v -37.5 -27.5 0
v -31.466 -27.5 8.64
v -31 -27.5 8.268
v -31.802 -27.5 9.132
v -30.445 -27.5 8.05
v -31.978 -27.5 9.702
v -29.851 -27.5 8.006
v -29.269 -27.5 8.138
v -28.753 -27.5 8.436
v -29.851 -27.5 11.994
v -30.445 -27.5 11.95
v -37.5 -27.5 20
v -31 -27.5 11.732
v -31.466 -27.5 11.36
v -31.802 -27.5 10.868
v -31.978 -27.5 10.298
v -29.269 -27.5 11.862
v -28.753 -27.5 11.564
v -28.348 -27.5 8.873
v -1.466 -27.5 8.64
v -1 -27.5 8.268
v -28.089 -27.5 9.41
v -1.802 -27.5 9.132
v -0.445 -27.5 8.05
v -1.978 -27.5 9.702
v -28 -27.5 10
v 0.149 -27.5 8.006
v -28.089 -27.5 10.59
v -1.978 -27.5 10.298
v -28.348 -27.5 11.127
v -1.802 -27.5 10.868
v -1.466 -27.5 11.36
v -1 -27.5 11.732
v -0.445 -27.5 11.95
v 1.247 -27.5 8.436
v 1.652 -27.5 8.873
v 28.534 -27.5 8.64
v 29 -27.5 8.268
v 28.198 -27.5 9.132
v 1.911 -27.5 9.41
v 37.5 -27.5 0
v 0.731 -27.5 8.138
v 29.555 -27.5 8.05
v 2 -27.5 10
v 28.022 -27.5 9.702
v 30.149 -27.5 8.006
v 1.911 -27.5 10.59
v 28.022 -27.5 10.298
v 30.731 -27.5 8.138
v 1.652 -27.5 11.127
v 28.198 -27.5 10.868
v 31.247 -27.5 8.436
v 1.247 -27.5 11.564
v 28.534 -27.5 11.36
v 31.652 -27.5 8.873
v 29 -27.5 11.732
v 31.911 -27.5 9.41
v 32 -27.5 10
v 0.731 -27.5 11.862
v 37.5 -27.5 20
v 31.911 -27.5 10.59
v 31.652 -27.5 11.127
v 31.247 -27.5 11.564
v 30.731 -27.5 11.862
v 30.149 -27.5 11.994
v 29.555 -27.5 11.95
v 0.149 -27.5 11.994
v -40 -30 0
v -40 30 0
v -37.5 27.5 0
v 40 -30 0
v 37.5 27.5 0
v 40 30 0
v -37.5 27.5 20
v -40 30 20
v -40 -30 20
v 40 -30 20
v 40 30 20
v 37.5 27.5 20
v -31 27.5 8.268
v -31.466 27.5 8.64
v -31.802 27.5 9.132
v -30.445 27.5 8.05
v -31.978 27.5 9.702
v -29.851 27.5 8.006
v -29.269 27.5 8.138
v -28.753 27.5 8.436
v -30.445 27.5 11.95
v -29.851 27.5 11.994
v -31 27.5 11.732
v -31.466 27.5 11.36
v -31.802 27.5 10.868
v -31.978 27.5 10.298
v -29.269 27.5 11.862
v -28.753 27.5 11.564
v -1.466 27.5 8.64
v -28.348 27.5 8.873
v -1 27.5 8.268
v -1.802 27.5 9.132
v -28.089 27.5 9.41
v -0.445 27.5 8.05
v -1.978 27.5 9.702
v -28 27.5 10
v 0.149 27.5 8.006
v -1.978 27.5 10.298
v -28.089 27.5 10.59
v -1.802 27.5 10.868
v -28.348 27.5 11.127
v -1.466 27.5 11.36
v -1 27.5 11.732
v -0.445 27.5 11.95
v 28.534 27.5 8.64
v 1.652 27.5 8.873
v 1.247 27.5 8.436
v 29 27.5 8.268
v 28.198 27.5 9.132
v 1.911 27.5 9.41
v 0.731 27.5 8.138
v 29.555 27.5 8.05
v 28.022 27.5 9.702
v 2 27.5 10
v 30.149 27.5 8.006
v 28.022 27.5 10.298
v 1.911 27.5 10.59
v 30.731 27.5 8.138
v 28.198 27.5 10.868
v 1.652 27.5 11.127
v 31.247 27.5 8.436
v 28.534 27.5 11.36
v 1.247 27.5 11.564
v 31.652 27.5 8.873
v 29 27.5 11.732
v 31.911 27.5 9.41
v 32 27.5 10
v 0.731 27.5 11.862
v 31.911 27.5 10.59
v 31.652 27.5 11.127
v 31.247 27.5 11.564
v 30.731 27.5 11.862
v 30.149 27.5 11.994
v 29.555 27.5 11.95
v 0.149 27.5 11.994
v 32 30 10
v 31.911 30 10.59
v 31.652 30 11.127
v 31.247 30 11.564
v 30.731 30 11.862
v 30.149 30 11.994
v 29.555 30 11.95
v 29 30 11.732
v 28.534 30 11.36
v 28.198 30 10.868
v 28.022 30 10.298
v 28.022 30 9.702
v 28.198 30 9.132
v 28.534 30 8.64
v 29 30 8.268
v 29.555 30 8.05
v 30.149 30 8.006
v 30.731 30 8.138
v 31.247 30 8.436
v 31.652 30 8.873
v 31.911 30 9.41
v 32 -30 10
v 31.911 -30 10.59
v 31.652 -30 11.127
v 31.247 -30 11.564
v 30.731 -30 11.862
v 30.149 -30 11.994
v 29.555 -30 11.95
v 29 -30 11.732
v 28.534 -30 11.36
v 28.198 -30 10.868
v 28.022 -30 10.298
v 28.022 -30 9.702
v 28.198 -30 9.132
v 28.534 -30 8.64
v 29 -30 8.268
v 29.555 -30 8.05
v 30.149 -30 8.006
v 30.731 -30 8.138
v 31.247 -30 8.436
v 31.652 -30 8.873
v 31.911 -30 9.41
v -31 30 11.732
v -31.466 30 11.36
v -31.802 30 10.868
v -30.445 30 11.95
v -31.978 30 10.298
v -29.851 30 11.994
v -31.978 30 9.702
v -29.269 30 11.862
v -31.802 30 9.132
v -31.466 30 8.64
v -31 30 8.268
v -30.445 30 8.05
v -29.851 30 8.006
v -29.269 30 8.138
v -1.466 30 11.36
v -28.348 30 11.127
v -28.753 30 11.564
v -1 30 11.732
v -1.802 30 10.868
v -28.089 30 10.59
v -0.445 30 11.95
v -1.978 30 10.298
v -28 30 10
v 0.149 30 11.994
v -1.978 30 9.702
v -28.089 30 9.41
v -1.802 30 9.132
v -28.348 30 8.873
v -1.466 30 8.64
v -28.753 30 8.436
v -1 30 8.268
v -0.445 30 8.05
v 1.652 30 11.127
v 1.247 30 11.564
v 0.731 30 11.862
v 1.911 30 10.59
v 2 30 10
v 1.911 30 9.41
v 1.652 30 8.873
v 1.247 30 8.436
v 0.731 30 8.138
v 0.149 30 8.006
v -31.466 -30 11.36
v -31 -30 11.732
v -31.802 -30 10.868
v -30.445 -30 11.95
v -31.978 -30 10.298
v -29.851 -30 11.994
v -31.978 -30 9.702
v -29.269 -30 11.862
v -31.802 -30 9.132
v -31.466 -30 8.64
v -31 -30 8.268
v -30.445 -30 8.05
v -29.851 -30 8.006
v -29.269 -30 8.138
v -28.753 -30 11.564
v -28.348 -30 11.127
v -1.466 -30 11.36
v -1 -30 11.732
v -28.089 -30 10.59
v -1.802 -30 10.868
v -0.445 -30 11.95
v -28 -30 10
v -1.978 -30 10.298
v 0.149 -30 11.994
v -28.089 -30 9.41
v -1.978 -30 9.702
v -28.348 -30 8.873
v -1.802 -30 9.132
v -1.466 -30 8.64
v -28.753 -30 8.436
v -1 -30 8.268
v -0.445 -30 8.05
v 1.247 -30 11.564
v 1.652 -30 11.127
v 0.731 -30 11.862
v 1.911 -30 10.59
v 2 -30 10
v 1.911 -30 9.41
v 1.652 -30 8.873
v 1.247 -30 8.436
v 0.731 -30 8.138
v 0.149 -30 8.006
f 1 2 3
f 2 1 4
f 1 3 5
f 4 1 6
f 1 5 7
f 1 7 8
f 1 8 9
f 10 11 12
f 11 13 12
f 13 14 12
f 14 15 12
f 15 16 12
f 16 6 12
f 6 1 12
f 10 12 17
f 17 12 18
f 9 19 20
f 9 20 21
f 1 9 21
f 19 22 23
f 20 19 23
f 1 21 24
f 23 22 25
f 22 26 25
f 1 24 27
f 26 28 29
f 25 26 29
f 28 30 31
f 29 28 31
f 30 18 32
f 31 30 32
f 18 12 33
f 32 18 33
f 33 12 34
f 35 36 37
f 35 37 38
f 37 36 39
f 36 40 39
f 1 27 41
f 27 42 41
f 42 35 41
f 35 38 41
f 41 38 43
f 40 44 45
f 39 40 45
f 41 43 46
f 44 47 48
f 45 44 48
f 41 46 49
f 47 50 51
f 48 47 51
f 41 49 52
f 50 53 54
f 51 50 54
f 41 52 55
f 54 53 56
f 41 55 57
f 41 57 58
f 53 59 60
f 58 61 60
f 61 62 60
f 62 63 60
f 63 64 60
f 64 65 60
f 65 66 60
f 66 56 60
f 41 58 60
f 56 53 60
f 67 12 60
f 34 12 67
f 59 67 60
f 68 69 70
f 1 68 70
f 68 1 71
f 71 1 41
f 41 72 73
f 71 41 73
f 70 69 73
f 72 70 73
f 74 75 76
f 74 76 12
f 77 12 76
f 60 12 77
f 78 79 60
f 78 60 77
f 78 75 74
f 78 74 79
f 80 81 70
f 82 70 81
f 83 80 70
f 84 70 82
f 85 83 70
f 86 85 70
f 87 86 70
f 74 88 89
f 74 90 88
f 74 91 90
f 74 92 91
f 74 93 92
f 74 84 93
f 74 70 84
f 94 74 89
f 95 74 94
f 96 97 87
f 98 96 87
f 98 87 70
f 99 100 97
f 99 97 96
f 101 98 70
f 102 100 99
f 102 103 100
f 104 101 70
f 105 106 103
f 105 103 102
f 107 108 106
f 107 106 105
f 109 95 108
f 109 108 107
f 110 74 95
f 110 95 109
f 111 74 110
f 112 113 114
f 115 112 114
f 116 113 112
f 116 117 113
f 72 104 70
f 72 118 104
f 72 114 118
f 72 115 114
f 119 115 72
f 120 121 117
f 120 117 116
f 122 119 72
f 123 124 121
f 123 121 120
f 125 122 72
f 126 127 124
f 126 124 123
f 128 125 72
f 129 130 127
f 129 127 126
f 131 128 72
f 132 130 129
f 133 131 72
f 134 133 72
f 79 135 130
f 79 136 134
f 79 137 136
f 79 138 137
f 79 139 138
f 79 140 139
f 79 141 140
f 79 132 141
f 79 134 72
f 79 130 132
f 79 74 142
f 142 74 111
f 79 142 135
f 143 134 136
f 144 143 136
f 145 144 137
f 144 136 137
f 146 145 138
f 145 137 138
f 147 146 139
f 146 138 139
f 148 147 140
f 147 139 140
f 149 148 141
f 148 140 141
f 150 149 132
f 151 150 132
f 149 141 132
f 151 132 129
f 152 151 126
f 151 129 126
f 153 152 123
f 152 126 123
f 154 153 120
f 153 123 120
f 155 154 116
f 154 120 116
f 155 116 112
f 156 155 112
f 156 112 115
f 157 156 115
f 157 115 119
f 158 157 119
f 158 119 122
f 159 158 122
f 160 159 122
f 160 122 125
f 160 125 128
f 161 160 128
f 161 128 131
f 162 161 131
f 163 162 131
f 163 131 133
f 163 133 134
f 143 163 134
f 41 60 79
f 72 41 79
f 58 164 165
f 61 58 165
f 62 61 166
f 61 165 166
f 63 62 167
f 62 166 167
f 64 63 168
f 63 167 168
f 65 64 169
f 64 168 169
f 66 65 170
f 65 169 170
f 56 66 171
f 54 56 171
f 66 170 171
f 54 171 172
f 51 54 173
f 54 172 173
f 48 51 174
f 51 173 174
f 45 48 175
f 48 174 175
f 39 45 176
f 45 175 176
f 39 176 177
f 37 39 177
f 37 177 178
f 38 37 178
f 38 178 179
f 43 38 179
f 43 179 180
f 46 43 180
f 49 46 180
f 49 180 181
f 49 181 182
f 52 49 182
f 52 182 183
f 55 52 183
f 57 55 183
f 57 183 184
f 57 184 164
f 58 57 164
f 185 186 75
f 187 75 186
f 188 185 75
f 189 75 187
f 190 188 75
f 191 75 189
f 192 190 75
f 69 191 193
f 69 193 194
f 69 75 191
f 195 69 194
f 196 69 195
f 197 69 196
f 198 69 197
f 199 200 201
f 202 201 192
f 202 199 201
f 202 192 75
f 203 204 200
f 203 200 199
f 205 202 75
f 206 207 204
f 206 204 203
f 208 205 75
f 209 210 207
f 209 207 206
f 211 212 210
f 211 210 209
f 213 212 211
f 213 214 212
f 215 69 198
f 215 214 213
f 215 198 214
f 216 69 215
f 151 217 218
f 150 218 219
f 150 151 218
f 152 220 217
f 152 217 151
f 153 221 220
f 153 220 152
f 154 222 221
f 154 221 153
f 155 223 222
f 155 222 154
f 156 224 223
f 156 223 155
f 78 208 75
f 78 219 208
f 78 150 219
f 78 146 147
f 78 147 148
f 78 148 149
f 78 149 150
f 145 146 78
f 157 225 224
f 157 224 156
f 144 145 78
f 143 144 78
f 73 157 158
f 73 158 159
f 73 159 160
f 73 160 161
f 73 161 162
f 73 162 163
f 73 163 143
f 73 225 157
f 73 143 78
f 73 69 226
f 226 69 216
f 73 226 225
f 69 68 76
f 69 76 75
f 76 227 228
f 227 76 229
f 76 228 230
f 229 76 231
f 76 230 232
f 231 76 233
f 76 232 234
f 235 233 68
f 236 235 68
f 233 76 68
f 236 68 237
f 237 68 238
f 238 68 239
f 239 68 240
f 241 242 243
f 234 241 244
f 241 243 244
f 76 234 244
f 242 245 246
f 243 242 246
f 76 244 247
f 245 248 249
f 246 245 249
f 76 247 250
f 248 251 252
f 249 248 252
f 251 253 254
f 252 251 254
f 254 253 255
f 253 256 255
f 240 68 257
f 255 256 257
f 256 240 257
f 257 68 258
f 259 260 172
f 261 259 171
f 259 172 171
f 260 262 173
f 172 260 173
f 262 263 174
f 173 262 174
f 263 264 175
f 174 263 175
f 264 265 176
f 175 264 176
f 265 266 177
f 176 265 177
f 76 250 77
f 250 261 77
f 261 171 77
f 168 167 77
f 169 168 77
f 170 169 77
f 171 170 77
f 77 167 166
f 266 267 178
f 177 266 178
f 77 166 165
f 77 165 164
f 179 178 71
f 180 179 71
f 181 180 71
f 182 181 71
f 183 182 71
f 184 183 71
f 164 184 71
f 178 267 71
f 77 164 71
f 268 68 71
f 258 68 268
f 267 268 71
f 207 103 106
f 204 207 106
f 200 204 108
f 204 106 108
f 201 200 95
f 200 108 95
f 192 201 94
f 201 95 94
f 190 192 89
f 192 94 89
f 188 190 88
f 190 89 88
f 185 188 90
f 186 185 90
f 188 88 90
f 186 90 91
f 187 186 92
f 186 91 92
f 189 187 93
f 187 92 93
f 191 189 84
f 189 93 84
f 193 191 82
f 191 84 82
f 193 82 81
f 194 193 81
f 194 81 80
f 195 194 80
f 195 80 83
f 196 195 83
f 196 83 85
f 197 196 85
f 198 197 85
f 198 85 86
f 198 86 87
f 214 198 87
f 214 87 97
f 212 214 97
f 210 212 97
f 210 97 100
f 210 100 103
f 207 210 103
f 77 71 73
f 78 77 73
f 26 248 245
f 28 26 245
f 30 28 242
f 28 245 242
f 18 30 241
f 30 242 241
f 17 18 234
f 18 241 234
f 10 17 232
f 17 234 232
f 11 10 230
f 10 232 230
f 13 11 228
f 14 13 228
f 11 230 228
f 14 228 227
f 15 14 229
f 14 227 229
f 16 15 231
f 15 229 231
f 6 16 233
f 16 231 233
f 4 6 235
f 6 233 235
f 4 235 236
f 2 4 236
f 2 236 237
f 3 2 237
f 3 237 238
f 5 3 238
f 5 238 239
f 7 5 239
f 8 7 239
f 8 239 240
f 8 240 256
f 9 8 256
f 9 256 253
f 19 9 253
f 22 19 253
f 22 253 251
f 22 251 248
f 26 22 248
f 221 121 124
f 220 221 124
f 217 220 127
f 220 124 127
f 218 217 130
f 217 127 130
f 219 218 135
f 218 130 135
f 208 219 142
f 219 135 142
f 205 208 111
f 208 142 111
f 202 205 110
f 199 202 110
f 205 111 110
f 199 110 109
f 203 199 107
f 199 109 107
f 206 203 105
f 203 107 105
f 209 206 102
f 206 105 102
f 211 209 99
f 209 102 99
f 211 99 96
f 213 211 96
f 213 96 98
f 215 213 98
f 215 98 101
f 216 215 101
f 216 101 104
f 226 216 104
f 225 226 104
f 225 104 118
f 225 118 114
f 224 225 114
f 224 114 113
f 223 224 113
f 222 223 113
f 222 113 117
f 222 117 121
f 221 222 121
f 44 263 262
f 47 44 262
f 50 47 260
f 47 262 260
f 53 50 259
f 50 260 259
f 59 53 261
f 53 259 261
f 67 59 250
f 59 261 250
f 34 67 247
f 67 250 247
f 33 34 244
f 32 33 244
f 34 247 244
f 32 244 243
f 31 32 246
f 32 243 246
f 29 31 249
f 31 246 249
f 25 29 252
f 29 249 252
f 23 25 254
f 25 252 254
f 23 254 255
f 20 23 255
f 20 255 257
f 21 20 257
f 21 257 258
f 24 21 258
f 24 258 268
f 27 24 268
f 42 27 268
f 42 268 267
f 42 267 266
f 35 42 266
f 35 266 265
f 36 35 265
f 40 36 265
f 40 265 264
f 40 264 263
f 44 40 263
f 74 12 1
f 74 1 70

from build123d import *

# Parameters (mm, degrees)
F0_W     = 80
F0_H     = 60
F1_DEPTH = 20
F2_W     = 75
F2_H     = 55
F3_DEPTH = 20.001
F4_R     = 2
F5_DEPTH = 60.001


with BuildPart() as f1:
    # F0 (on Top) → F1 (new body)
    with BuildSketch(Plane.XY):
        Rectangle(F0_W, F0_H)
    extrude(amount=F1_DEPTH)

    # F2 (on face) → F3 (cut, through all)
    with BuildSketch(Plane.XY.offset(20)):
        Rectangle(F2_W, F2_H)
    extrude(amount=-F3_DEPTH, mode=Mode.SUBTRACT)

    # F4 (on face) → F5 (cut, through all)
    with BuildSketch(Plane.XZ.offset(30)):
        with Locations((-30, 10)):
            Circle(F4_R)
        with Locations((0, 10)):
            Circle(F4_R)
        with Locations((30, 10)):
            Circle(F4_R)
    extrude(amount=-F5_DEPTH, mode=Mode.SUBTRACT)


solid = f1.part
